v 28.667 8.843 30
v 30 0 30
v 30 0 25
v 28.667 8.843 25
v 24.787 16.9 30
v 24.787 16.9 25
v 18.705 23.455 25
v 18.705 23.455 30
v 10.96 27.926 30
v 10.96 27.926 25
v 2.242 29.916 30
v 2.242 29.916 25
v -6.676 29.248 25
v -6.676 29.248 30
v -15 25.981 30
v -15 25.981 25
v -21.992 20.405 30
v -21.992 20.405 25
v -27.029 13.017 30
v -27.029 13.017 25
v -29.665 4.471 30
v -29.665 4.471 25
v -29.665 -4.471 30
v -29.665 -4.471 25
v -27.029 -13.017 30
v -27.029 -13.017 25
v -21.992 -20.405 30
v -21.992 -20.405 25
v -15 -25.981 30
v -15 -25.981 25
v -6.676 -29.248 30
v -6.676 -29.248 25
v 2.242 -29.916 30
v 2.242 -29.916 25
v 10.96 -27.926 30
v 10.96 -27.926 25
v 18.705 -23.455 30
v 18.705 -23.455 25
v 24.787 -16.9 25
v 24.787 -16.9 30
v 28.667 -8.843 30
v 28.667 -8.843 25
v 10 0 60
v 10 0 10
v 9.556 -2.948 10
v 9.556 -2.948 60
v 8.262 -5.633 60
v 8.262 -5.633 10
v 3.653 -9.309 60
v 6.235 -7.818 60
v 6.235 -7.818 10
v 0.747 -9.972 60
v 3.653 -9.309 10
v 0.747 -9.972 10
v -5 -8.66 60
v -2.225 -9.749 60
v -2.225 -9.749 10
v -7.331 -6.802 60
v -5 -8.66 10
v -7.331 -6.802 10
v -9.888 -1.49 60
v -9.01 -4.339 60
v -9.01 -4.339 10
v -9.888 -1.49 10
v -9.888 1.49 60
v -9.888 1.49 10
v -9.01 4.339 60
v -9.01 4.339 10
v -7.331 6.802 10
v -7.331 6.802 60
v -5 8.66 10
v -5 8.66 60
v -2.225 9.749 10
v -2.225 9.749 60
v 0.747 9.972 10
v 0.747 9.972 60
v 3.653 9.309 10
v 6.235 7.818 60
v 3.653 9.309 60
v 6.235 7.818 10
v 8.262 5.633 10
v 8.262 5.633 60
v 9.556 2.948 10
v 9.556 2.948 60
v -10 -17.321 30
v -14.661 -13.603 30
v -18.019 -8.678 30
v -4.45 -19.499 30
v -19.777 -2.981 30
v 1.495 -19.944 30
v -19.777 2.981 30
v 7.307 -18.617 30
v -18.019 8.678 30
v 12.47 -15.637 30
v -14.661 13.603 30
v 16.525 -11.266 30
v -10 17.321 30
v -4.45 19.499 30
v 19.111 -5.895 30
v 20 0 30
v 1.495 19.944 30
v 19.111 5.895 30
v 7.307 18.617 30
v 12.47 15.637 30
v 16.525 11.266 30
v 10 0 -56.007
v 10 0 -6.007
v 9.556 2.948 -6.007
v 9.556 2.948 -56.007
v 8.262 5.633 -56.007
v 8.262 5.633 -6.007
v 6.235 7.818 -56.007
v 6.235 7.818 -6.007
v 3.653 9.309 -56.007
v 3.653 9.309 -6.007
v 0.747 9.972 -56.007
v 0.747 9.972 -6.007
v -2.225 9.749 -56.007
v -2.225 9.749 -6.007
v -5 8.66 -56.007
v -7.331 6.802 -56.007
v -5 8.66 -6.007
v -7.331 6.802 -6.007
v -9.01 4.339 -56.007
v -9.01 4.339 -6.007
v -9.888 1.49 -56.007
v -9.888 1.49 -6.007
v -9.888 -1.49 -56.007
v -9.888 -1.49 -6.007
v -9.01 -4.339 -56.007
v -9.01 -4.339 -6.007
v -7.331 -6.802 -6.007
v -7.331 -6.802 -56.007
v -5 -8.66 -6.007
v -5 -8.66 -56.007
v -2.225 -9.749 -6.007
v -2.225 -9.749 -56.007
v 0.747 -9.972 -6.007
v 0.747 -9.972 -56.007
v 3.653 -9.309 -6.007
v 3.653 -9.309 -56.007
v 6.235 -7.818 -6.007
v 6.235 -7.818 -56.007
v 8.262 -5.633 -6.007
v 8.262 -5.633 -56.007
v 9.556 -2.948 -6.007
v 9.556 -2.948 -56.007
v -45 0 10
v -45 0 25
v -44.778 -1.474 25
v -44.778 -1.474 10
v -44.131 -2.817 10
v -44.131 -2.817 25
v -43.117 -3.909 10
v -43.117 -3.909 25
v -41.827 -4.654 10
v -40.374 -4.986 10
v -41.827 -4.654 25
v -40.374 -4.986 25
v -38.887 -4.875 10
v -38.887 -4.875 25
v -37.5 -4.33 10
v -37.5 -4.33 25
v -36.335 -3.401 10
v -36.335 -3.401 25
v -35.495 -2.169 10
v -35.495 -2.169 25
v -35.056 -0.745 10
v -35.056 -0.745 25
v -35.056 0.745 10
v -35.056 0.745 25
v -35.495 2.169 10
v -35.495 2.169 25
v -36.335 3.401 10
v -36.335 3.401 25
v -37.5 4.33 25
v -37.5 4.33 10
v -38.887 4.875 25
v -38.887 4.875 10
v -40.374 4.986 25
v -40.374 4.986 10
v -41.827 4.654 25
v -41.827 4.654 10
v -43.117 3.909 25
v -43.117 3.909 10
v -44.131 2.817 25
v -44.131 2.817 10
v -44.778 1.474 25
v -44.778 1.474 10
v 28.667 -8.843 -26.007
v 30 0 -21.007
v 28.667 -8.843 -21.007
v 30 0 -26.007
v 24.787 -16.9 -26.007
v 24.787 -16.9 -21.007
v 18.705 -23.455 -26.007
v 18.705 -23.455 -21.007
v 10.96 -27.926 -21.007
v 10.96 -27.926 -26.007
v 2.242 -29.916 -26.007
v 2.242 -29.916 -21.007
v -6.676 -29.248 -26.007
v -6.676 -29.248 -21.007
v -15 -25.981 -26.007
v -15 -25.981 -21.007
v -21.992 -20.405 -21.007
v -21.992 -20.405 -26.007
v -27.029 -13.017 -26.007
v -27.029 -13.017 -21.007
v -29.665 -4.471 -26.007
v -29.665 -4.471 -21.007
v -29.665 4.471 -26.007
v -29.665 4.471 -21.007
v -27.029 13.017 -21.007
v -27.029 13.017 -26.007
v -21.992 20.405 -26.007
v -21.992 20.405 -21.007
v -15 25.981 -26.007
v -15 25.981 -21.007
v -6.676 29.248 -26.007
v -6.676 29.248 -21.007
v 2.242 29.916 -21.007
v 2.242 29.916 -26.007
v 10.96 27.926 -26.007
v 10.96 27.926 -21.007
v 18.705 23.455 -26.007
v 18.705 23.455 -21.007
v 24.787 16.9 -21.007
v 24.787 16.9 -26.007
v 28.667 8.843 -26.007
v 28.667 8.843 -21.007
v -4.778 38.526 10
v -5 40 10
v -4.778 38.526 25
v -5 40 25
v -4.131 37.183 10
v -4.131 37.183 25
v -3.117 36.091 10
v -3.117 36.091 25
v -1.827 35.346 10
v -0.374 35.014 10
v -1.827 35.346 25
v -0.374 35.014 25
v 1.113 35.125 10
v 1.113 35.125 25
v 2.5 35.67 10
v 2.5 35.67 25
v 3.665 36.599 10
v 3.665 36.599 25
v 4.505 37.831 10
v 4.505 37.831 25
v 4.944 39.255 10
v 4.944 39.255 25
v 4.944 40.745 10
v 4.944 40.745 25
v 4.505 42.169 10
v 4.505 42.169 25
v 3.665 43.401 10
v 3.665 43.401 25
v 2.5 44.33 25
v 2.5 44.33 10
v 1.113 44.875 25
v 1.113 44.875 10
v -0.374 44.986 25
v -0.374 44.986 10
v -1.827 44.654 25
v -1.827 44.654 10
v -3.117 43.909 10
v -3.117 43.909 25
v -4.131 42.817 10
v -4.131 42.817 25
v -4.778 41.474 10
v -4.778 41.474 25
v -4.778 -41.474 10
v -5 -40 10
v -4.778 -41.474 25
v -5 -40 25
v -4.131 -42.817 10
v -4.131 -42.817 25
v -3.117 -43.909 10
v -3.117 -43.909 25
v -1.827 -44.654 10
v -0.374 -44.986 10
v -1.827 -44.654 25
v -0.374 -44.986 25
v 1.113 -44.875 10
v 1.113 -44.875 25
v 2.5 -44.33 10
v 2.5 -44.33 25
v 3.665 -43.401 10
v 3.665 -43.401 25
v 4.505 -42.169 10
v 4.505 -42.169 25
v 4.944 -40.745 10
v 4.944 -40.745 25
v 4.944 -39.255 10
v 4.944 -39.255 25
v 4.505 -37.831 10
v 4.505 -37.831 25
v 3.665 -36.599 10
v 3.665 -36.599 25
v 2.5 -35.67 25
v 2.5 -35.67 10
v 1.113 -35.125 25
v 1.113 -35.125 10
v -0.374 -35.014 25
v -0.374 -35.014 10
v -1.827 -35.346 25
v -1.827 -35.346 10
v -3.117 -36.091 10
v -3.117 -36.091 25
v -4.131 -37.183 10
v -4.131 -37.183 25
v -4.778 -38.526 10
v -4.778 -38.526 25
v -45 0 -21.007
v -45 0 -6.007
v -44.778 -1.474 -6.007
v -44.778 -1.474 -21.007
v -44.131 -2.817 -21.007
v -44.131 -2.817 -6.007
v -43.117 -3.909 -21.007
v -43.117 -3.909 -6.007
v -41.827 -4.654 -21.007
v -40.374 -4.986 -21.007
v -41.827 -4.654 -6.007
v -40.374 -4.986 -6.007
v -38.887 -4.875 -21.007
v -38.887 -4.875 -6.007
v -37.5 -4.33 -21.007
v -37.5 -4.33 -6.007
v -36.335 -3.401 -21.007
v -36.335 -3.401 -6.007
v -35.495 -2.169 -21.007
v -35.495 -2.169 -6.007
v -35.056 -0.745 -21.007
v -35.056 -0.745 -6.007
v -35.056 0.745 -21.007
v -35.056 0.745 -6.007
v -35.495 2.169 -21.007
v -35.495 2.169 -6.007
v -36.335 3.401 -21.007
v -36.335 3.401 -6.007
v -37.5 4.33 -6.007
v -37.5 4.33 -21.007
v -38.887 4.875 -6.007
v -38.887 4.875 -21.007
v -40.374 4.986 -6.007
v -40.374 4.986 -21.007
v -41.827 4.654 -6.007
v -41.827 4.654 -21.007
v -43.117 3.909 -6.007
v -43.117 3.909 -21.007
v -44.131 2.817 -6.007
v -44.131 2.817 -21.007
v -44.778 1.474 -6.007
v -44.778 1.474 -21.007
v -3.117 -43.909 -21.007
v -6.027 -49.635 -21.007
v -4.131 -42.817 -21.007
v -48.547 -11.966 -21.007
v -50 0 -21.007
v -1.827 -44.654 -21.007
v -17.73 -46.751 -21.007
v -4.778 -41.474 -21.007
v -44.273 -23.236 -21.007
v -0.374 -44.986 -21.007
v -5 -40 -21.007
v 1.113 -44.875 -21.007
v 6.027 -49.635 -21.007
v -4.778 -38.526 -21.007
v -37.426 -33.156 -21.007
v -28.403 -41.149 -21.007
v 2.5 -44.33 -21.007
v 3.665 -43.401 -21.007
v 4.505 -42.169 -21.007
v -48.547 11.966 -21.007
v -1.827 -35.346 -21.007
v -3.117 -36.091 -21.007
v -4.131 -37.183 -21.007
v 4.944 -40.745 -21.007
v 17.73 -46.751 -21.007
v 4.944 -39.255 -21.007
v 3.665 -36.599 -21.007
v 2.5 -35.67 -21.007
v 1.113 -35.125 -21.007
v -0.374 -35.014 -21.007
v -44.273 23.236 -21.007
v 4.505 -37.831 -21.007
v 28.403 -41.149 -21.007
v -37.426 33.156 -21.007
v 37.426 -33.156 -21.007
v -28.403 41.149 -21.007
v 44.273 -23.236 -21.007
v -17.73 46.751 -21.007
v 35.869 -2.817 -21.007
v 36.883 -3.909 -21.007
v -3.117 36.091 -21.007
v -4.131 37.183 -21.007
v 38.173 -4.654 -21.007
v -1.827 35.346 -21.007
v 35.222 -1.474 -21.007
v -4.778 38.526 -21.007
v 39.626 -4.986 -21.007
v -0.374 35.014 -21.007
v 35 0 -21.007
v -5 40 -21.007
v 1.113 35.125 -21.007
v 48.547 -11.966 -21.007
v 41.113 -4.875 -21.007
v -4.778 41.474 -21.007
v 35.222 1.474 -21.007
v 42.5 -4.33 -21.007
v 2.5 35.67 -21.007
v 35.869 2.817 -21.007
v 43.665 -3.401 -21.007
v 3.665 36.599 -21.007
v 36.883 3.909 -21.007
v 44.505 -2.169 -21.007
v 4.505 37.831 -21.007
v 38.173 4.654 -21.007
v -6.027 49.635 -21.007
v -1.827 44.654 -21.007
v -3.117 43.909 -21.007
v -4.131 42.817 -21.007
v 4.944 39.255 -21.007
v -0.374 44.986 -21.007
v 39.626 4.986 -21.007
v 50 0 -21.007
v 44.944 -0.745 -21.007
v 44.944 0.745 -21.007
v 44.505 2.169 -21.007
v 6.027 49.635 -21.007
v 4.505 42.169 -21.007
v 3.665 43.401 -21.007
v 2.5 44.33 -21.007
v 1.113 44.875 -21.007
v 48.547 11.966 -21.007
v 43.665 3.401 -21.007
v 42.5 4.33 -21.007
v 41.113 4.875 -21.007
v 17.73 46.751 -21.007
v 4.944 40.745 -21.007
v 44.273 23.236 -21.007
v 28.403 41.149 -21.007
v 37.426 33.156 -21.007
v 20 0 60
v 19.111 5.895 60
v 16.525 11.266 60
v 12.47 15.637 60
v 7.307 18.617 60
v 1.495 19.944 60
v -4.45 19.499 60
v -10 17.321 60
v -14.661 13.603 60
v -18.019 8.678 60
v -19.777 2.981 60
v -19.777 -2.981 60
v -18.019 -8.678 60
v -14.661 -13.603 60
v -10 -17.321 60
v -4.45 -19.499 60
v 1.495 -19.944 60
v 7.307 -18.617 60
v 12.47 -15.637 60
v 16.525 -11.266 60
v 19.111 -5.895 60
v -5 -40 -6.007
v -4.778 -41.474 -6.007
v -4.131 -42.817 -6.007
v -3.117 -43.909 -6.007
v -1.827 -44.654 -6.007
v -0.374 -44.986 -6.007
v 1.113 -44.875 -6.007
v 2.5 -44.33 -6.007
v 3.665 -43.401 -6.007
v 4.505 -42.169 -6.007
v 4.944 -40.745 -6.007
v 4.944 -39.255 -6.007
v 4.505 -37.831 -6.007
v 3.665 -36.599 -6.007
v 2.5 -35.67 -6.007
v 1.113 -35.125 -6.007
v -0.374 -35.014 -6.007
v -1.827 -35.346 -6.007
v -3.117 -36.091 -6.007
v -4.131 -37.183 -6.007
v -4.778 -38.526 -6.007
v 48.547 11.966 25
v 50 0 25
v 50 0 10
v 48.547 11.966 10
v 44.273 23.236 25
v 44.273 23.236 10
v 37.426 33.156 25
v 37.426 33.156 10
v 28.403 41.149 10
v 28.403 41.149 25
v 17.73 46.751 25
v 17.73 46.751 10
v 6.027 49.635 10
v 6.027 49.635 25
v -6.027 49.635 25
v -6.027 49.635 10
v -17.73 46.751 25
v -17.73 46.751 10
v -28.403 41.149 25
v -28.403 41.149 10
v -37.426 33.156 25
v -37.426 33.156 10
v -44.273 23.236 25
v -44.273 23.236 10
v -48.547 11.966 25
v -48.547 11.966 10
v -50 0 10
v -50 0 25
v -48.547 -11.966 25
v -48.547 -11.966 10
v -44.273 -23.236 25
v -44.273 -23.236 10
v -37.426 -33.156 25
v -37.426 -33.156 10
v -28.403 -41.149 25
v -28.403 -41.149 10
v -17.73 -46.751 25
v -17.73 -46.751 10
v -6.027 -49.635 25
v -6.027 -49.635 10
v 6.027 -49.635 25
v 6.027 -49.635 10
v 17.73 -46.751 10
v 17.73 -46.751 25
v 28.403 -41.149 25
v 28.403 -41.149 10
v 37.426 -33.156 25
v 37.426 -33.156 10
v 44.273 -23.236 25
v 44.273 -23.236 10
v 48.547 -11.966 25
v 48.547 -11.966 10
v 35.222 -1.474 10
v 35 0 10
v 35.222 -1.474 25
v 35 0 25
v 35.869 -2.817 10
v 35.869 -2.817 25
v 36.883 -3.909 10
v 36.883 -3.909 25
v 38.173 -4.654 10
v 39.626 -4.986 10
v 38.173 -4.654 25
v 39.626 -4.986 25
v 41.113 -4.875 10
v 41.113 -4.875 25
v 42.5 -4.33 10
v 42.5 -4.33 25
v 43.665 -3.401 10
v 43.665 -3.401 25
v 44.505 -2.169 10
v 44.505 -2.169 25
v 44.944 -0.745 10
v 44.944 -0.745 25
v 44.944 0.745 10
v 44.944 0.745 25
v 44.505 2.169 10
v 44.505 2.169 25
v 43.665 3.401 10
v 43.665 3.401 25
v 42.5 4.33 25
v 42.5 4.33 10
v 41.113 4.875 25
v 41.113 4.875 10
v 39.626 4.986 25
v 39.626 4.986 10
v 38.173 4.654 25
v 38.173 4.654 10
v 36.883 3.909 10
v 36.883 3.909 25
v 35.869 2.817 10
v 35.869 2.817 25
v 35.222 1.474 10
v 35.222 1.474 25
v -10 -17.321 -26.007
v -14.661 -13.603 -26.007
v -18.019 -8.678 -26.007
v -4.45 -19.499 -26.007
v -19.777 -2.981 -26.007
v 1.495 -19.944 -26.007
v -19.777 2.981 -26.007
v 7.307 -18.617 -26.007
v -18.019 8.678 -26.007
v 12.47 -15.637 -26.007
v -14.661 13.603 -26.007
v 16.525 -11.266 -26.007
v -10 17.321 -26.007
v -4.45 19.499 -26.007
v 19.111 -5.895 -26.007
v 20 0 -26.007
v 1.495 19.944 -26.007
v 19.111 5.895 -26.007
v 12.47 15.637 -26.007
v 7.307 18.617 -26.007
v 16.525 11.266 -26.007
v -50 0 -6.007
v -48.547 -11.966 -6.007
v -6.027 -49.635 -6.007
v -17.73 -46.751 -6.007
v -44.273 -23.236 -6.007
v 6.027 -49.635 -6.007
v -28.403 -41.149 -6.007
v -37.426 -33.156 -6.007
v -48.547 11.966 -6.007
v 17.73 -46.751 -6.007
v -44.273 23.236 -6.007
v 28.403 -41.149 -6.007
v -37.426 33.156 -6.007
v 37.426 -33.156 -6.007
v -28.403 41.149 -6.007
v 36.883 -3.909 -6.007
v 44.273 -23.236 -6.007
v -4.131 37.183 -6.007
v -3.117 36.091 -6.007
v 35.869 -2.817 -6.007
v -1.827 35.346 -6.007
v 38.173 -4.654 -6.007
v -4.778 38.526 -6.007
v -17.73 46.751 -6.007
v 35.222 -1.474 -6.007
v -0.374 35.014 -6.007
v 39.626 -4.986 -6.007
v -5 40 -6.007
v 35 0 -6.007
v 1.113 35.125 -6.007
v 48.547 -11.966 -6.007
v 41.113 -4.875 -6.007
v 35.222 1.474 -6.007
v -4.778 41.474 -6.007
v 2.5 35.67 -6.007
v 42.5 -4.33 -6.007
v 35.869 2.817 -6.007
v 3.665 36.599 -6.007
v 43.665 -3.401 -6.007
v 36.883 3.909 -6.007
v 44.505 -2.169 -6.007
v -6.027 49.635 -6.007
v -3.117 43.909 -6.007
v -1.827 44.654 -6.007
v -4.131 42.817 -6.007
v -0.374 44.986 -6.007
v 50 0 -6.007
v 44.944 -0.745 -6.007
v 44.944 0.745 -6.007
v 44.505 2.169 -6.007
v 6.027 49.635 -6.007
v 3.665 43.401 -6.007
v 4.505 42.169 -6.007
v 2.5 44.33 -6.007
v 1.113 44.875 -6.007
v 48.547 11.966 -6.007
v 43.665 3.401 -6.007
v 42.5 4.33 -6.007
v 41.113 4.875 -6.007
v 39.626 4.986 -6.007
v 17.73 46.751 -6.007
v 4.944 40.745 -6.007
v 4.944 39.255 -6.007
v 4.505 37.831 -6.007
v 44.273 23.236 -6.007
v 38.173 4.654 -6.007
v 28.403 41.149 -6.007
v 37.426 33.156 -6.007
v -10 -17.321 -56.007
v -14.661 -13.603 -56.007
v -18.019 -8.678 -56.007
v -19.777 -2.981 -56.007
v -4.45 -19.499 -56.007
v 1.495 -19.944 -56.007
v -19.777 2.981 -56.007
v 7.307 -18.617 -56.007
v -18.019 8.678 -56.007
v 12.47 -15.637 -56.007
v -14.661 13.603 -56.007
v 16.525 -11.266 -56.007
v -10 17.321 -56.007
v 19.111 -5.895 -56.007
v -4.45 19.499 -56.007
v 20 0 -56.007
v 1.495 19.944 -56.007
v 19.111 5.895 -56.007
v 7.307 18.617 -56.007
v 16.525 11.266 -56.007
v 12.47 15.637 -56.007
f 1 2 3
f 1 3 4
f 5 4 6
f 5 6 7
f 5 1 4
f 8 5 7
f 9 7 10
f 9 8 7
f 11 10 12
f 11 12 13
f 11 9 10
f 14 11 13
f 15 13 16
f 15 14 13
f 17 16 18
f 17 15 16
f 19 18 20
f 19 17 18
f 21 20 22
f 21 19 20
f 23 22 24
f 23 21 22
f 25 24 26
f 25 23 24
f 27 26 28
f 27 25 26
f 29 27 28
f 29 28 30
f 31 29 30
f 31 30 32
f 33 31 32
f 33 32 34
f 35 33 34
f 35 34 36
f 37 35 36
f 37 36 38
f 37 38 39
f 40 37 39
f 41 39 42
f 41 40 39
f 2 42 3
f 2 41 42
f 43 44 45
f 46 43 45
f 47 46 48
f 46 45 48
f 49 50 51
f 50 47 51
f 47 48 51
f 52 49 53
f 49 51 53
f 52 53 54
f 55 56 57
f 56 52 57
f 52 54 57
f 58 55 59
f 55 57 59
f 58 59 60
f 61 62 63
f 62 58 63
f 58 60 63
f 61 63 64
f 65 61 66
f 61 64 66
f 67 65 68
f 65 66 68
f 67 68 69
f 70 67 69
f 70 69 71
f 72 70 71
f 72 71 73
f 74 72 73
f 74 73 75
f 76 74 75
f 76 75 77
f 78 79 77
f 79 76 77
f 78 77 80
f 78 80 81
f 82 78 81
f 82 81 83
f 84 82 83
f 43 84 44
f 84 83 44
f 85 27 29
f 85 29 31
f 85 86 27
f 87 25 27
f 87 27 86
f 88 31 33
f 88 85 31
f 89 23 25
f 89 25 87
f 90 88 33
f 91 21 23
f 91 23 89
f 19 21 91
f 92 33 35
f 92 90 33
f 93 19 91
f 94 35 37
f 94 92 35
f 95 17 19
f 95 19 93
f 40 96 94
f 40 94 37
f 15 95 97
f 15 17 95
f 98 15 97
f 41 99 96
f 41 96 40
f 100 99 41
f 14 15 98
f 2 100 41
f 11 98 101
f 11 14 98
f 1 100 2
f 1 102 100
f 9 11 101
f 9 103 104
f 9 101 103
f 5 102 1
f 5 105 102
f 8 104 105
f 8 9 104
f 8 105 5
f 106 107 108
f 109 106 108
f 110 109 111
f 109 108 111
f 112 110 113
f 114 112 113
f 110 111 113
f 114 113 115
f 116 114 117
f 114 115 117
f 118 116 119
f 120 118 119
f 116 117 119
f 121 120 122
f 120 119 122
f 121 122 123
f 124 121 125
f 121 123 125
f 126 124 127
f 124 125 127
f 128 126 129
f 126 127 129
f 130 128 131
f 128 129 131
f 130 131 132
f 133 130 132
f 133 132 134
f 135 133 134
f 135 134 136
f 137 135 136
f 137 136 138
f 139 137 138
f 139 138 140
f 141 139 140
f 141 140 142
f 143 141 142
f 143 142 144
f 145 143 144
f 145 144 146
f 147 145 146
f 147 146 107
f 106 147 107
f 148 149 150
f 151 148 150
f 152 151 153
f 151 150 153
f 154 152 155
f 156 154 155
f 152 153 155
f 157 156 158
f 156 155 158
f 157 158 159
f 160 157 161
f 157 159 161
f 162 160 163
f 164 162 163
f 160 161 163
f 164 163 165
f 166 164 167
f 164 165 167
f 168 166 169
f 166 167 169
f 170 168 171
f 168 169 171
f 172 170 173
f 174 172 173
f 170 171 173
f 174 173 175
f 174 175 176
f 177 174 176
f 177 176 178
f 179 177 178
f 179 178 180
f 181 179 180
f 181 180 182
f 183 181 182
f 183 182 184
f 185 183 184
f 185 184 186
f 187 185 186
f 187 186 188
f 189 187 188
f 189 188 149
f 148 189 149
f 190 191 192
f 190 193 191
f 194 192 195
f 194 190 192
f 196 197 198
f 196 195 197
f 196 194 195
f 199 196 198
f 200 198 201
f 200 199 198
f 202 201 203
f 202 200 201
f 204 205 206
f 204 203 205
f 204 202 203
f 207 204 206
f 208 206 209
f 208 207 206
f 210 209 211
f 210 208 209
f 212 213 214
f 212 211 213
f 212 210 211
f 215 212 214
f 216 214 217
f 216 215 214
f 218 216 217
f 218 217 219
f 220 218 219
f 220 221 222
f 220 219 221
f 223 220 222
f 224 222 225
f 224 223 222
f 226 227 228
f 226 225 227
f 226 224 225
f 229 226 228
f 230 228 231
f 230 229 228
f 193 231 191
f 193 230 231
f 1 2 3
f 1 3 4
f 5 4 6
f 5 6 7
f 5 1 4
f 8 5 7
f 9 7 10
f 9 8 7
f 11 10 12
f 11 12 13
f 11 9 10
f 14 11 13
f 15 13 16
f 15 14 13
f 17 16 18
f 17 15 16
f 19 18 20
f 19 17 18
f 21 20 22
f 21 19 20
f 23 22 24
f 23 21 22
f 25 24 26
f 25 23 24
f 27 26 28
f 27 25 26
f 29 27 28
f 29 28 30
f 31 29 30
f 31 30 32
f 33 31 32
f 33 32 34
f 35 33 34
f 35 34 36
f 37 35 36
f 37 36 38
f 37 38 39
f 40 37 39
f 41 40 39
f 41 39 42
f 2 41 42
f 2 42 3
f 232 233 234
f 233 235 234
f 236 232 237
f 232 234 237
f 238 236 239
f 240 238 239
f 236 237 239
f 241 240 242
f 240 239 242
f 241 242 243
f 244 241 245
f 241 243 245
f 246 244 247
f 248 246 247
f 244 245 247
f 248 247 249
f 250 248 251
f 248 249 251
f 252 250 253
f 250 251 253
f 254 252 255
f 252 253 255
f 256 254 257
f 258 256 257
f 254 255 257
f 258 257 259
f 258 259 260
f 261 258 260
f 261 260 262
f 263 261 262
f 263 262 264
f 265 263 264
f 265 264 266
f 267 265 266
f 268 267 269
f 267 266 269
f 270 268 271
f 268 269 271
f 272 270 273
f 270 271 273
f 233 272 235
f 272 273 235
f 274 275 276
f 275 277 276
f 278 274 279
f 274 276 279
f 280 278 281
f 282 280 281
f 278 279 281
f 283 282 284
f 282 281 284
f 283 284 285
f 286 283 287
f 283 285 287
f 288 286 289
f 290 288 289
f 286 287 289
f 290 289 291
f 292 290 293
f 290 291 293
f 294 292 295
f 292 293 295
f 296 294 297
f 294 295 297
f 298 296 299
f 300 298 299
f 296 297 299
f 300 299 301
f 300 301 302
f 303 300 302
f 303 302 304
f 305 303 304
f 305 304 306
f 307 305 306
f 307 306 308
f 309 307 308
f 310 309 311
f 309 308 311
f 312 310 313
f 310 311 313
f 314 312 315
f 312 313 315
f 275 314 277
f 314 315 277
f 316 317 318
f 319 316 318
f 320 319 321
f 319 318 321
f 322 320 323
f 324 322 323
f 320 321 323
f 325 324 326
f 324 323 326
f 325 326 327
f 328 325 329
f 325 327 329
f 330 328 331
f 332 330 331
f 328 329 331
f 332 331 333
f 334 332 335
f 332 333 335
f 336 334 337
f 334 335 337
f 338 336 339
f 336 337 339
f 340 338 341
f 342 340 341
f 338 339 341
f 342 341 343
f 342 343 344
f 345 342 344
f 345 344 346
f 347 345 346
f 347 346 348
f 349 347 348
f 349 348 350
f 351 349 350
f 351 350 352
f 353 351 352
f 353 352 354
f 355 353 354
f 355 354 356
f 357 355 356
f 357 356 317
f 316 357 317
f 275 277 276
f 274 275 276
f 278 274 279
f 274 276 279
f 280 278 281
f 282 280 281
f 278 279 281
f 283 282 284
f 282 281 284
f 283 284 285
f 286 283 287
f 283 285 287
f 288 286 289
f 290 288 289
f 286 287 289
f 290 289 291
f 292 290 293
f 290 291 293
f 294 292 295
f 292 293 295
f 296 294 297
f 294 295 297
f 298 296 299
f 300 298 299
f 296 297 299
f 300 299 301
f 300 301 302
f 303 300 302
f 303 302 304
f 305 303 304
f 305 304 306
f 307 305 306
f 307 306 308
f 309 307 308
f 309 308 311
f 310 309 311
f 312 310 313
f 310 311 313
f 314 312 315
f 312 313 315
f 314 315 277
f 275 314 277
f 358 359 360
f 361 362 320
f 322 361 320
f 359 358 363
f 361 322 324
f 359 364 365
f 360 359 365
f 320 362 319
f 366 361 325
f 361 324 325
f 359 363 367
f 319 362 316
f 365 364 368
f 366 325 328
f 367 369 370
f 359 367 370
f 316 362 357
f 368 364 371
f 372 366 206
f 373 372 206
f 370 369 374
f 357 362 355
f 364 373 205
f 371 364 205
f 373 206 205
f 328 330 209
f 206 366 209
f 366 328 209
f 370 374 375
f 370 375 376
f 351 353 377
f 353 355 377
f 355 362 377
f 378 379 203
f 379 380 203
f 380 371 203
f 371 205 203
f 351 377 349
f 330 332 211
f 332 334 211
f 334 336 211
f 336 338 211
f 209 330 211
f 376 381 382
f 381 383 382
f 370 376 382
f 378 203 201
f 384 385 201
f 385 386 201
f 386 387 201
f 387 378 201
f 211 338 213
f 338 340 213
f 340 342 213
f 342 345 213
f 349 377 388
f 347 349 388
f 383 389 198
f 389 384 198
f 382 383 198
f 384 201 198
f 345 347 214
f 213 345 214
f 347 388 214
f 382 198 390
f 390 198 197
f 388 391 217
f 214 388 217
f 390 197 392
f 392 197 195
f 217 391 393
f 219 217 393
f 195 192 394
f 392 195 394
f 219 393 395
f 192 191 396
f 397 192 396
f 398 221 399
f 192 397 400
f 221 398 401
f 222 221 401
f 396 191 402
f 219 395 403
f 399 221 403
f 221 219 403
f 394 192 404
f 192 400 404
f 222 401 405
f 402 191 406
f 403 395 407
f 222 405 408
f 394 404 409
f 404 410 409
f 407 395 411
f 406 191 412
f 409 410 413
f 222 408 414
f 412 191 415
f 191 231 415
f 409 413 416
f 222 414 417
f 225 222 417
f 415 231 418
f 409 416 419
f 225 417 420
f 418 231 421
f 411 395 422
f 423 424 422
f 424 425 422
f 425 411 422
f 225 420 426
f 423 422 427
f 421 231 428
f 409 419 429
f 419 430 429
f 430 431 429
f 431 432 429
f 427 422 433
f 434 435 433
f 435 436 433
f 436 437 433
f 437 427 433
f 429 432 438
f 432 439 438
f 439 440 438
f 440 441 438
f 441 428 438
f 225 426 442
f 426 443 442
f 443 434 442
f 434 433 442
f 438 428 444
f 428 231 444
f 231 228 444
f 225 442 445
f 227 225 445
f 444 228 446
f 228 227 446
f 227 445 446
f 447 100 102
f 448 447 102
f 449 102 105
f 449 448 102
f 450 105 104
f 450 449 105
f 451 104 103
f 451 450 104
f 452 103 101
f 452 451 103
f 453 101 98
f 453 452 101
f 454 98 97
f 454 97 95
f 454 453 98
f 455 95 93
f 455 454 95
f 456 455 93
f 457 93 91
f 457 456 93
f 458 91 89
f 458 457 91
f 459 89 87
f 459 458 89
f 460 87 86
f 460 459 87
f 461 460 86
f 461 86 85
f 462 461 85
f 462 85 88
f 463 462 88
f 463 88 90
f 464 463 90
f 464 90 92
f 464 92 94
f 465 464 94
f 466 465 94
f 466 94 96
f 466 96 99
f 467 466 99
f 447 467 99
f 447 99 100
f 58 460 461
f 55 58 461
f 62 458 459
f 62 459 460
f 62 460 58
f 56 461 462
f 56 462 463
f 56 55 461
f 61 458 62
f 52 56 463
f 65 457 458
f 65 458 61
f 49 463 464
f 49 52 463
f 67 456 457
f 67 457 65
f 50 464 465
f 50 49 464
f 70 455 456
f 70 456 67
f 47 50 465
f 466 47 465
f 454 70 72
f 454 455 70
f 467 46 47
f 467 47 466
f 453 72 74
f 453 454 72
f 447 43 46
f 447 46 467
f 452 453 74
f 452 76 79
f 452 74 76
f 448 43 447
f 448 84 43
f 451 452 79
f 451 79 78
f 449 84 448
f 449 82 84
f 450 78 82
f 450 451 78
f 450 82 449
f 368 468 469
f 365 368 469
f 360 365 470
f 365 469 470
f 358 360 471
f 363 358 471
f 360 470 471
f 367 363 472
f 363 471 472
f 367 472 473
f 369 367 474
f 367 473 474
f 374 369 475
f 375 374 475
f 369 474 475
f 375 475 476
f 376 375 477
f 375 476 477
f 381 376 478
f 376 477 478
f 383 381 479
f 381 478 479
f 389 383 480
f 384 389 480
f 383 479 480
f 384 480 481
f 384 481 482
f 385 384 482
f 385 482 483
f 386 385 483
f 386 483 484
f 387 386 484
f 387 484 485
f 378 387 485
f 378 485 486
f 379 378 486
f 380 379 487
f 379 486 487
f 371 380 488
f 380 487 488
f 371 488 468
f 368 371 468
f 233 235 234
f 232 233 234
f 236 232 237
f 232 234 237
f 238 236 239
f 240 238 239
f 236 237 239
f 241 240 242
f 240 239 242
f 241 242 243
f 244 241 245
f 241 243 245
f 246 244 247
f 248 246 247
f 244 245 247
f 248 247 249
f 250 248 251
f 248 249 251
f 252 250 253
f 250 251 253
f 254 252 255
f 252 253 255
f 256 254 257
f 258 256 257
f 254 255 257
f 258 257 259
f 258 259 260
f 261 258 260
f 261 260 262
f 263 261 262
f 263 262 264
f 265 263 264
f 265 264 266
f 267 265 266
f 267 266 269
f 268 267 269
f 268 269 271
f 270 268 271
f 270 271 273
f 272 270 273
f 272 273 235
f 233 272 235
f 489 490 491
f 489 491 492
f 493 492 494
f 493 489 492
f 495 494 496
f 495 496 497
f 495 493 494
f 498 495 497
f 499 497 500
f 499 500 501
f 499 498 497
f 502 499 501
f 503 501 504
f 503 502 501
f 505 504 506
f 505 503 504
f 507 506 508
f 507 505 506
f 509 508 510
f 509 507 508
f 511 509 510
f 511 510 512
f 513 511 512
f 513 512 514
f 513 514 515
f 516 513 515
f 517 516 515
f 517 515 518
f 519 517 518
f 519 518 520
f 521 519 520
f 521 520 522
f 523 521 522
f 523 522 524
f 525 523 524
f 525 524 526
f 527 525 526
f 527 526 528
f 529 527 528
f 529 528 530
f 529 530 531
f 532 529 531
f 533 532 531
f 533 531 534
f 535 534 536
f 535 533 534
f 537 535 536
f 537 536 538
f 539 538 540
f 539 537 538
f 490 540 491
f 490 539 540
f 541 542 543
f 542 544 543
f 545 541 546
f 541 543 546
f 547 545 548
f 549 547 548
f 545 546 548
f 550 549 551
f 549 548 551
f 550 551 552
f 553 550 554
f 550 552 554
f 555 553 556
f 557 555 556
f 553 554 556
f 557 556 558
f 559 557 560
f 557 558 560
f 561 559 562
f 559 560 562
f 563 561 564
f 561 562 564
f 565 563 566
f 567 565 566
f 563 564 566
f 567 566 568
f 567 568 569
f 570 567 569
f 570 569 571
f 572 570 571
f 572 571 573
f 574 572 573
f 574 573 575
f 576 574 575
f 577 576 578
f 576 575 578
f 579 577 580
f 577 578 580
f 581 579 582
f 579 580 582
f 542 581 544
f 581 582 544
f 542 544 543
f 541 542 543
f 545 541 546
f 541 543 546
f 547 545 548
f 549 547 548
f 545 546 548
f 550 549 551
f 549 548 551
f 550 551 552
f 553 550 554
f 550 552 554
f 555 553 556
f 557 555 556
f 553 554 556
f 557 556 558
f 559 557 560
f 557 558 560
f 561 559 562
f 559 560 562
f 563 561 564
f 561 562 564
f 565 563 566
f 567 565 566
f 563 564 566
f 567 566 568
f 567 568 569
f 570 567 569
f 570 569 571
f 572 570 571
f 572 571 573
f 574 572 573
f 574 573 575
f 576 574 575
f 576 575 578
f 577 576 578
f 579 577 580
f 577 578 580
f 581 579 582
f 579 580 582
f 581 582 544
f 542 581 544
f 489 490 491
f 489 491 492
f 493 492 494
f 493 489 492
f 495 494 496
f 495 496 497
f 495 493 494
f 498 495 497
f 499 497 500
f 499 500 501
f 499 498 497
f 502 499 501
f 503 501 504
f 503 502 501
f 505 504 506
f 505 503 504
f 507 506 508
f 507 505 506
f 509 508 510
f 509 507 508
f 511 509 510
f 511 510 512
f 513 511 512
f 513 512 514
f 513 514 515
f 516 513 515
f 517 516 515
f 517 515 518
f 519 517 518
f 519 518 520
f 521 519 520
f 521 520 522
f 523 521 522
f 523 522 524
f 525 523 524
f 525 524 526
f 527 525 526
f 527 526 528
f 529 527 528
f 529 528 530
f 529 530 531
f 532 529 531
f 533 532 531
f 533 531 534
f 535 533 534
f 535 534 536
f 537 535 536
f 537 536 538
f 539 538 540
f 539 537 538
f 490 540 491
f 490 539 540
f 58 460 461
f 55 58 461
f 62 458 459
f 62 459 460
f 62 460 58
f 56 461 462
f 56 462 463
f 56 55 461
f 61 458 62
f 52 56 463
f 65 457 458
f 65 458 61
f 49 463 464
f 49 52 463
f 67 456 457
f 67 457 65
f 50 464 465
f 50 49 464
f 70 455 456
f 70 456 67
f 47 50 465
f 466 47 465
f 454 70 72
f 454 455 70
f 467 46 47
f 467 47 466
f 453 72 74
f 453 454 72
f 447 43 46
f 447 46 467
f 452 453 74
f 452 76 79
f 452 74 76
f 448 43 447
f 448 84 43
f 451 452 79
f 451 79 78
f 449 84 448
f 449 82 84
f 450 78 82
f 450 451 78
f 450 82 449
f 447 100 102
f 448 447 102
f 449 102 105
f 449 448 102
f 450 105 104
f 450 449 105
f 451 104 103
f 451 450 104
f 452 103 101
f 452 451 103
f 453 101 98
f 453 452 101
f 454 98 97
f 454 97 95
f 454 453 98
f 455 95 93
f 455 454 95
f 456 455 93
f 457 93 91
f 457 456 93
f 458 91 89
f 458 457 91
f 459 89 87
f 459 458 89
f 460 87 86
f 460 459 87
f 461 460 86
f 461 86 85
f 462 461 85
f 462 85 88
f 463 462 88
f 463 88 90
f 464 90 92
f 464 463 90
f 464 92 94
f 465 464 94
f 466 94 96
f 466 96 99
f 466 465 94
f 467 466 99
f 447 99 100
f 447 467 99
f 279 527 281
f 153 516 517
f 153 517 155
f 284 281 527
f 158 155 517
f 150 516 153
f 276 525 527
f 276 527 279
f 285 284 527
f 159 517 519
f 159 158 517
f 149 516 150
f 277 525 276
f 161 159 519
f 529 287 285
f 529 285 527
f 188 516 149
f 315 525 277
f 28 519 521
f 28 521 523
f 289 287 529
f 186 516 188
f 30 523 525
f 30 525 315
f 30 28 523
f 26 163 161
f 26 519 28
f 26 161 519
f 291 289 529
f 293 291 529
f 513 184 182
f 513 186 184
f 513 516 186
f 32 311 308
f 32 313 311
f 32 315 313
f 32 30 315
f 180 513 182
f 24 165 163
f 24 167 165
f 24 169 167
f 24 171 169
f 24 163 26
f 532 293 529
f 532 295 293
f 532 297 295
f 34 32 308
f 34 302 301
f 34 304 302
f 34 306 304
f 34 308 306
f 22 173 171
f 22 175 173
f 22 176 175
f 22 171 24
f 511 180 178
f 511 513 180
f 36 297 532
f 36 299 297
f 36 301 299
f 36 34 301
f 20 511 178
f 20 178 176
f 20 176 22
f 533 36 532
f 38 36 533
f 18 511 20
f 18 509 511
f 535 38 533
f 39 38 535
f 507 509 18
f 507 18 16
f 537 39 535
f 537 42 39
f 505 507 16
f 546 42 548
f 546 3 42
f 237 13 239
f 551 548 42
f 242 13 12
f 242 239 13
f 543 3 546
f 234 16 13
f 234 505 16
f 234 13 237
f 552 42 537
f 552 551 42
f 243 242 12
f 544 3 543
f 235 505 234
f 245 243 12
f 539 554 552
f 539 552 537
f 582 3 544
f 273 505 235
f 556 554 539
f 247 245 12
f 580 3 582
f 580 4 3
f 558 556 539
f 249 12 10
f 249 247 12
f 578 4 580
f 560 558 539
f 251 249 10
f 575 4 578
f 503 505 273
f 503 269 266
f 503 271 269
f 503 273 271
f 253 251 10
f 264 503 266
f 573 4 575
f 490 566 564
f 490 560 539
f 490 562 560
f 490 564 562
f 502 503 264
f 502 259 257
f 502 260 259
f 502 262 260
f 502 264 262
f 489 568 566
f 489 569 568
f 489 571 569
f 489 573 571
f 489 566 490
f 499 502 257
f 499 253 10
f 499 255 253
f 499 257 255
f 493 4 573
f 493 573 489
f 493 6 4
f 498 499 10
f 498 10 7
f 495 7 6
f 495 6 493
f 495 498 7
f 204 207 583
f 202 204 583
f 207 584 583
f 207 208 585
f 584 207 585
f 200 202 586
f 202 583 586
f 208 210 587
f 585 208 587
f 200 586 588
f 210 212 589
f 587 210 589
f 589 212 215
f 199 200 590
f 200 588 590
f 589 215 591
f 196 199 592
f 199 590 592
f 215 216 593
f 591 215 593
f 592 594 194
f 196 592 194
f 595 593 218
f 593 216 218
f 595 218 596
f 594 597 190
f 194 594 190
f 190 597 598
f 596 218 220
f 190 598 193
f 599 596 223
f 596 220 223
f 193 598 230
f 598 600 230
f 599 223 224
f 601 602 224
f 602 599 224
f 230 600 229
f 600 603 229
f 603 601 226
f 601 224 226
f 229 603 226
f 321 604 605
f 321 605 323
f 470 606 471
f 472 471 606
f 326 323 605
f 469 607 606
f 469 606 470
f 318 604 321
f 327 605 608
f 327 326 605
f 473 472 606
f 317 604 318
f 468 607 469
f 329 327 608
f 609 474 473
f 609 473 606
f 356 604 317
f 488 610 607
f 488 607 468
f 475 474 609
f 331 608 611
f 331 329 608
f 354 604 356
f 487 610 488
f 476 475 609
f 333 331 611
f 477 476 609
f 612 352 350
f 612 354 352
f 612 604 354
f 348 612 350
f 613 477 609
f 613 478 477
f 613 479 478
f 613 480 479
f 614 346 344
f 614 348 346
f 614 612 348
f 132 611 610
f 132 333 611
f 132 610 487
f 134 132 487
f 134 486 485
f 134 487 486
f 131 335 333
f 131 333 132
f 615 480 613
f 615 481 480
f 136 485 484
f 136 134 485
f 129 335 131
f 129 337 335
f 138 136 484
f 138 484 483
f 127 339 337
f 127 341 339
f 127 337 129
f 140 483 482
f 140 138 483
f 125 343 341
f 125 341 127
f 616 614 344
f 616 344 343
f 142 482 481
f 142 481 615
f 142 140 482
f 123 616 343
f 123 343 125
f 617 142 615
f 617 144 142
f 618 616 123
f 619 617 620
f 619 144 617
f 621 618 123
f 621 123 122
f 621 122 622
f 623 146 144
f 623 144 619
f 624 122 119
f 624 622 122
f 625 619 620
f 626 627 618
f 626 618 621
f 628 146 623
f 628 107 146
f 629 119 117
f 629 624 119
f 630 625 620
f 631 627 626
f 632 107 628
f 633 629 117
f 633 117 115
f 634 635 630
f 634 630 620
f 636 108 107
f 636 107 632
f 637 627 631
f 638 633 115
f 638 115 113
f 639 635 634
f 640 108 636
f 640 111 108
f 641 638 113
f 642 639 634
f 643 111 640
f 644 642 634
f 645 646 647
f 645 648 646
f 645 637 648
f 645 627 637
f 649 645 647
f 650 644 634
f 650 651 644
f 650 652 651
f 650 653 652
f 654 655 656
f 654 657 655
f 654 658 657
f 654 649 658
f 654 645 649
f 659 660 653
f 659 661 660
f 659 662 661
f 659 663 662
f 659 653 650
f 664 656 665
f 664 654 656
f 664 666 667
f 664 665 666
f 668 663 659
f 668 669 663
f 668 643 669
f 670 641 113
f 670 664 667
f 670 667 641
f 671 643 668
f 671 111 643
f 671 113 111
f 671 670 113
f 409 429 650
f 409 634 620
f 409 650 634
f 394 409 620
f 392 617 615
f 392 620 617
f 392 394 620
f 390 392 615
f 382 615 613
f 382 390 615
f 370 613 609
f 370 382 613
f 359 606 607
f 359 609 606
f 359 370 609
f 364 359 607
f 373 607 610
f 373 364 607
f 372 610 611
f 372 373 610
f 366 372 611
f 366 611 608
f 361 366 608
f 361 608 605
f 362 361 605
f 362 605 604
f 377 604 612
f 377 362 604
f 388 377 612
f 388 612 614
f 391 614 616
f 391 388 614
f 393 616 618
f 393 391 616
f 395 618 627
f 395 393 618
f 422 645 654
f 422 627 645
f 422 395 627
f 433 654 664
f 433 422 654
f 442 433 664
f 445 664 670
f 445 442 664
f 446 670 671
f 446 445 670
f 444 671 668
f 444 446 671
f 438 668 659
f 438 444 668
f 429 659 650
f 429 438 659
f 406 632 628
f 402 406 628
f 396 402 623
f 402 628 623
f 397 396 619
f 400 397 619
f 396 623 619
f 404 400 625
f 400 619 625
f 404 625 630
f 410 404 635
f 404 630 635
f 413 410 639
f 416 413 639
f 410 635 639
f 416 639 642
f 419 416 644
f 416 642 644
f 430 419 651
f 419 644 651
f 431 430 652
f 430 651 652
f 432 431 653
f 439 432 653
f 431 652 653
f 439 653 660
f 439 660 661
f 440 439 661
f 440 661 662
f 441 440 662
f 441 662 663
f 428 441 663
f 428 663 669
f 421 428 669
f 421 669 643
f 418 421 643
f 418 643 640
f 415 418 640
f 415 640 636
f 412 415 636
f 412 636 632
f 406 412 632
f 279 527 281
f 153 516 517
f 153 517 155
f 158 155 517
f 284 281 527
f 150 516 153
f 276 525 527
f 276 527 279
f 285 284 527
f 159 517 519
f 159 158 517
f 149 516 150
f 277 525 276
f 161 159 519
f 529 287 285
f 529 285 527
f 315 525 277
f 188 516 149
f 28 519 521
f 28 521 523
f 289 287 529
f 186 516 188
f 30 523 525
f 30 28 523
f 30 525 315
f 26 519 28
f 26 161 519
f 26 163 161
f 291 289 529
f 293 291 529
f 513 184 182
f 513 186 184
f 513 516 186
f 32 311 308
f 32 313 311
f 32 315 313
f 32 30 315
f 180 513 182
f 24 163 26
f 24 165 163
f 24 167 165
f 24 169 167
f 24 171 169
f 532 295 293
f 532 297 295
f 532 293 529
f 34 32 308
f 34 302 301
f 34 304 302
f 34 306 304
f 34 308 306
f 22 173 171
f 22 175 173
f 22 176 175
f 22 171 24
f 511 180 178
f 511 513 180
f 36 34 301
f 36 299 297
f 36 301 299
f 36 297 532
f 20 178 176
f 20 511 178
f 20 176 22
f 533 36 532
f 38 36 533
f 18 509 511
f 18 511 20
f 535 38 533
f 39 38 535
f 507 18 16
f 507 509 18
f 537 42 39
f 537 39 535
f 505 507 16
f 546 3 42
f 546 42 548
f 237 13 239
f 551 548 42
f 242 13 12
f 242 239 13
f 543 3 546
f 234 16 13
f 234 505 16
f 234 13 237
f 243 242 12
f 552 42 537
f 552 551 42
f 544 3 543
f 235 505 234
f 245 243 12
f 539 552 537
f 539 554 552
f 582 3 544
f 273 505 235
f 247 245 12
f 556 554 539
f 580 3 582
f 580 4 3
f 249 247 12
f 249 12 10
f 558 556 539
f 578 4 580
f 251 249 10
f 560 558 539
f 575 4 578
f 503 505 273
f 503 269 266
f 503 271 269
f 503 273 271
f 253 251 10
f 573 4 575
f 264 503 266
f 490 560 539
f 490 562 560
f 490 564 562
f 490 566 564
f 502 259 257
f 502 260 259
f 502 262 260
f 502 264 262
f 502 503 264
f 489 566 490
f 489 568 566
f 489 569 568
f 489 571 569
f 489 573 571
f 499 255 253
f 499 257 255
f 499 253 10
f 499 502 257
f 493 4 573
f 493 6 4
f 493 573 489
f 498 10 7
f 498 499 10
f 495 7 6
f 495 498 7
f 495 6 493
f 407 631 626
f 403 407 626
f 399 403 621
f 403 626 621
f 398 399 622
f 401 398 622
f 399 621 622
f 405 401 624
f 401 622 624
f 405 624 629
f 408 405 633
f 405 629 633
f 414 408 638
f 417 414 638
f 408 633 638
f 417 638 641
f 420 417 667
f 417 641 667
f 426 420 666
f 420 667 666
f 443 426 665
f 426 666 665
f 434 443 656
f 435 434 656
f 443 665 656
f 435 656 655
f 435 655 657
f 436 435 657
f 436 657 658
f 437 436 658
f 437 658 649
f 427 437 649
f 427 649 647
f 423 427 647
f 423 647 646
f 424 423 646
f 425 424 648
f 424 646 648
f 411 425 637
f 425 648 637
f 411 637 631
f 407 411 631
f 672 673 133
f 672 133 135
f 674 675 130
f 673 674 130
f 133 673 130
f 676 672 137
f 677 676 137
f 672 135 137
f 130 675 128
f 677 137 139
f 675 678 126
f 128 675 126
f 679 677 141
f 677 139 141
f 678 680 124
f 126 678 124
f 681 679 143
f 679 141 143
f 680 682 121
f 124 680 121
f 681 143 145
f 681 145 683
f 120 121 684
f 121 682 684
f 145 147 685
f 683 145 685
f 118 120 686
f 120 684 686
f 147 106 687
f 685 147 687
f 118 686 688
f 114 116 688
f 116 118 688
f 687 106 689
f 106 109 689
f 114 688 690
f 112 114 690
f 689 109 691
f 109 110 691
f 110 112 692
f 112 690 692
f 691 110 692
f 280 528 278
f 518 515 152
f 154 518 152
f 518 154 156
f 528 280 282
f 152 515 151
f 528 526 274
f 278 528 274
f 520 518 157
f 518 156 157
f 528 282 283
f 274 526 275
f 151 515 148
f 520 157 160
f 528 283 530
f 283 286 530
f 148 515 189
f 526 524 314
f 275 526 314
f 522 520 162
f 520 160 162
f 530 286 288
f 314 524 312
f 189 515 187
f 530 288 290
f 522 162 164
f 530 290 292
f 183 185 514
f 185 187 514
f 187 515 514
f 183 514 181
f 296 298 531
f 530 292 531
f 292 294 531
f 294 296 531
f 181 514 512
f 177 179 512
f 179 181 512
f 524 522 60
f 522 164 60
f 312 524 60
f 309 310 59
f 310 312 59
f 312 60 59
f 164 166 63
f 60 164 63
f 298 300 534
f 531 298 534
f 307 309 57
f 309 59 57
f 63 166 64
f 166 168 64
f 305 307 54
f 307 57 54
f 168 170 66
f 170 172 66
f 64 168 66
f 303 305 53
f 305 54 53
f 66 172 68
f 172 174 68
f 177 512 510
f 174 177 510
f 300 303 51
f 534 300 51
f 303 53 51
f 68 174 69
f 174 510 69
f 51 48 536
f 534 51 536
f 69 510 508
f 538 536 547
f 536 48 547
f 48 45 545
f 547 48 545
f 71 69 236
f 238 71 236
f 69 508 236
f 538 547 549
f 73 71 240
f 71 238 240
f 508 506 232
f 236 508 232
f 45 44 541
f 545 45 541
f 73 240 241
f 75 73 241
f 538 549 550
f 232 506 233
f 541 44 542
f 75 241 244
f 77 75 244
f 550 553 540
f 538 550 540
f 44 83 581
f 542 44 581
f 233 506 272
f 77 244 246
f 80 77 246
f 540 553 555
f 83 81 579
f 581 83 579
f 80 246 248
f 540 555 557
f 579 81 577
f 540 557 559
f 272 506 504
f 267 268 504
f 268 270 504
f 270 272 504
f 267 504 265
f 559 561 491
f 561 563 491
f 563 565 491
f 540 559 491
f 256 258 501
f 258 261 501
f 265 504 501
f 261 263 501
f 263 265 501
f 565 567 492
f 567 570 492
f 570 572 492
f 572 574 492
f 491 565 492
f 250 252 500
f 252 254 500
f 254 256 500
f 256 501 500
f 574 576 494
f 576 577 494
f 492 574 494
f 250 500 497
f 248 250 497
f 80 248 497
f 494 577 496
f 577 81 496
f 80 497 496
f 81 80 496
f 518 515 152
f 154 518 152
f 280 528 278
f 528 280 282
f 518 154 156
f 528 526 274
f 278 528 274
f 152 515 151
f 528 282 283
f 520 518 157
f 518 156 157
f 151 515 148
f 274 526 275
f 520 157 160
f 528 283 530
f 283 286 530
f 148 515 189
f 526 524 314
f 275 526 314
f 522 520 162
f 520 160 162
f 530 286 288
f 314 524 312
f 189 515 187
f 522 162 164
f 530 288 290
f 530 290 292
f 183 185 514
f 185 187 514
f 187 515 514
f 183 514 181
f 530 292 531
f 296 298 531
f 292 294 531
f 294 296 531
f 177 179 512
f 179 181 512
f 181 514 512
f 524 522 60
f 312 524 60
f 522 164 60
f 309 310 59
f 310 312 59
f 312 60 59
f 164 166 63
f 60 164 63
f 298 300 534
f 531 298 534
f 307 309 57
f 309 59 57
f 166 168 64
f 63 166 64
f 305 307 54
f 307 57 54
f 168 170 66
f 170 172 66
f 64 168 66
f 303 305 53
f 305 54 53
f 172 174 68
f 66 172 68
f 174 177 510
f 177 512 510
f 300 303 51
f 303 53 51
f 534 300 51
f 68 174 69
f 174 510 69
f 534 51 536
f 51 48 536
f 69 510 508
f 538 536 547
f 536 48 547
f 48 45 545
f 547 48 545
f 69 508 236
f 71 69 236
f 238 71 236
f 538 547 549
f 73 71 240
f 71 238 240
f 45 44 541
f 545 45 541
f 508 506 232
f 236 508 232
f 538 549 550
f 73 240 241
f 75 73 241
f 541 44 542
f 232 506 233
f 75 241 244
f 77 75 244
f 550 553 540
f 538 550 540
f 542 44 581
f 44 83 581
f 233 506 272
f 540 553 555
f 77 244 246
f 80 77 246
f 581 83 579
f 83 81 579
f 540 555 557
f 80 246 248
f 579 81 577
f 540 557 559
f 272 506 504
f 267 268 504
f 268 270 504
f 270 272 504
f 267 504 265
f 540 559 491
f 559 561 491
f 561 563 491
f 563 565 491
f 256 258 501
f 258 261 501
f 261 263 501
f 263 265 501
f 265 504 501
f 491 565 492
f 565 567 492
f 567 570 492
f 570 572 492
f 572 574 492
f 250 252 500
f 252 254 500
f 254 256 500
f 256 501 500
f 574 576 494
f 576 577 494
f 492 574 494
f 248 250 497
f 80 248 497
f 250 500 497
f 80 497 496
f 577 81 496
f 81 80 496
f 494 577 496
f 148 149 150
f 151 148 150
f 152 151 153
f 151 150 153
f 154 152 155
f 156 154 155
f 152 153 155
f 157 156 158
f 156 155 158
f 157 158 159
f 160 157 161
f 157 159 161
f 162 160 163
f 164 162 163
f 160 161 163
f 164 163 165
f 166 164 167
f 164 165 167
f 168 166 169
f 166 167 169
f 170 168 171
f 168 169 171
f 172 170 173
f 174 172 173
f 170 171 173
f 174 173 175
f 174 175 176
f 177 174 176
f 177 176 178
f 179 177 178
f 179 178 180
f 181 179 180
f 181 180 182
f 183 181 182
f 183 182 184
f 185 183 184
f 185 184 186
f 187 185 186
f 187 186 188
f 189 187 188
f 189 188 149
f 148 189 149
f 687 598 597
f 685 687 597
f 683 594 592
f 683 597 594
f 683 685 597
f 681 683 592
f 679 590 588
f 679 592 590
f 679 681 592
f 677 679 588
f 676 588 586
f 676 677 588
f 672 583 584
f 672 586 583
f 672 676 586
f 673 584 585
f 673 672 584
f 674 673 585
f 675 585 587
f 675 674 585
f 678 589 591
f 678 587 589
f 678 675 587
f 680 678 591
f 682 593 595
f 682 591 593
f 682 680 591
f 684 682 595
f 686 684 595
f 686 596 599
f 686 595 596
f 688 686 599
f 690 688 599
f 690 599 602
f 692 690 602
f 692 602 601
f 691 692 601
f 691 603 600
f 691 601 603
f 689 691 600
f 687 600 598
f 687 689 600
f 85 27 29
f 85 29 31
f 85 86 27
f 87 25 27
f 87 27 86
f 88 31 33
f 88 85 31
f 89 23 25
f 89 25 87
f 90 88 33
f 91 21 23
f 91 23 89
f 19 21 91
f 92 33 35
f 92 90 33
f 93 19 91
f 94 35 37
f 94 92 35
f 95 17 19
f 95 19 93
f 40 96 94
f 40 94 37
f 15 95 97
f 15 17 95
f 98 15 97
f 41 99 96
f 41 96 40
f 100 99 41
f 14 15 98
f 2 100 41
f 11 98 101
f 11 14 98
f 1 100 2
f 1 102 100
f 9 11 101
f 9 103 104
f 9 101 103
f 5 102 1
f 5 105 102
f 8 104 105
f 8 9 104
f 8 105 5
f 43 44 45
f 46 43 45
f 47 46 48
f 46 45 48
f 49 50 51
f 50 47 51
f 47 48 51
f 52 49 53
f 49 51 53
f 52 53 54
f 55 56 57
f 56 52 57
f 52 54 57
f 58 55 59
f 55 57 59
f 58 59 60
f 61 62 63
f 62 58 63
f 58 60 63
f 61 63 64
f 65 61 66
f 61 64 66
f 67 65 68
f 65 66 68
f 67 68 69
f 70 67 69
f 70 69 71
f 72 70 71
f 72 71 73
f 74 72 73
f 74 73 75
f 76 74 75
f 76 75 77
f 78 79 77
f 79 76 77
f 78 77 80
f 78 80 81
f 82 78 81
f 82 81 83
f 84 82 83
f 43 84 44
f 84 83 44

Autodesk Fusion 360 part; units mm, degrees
sketch "Sketch1" plane through (0, 0, 0) normal (0, 1, 0) x (1, 0, 0)
  line L0 (10, -60) -> (10, -10)
  line L1 (10, -10) -> (50, -10)
  line L2 (50, -10) -> (50, -25)
  line L3 (50, -25) -> (30, -25)
  line L4 (30, -25) -> (30, -30)
  line L5 (30, -30) -> (20, -30)
  line L6 (20, -30) -> (20, -60)
  line L7 (10, -60) -> (20, -60)
  line L8 (59.5256, -1.9963) -> (0, -1.9963)
  line L9 (10, 56.0073) -> (20, 56.0073)
  line L10 (20, 26.0073) -> (20, 56.0073)
  line L11 (10, 56.0073) -> (10, 6.0073)
  line L12 (10, 6.0073) -> (50, 6.0073)
  line L13 (50, 6.0073) -> (50, 21.0073)
  line L14 (50, 21.0073) -> (30, 21.0073)
  line L15 (30, 21.0073) -> (30, 26.0073)
  line L16 (30, 26.0073) -> (20, 26.0073)
revolve "Revolve2" add sketch "Sketch1" angle 360 about axis through (0, 0, 1.75) along (0, 0, 1) makes body 1 at (36.4433, -2.9808, 10) makes body 2 at (36.4433, -2.9808, -6.0073)
revolve "Revolve1" add sketch "Sketch1" angle 360 about axis through (0, 0, 1.75) along (0, 0, 1) separate body contours L0 L1 L2 L3 L4 L5 L6 L7 makes body 3
sketch "Sketch2" plane through (0, 0, 25) normal (0, 0, 1) x (-1, 0, 0)
  circle A0 centre (0, 0) radius 50
  circle A1 centre (0, 0) radius 30
  circle A2 centre (0, -40) radius 5
  circle A3 centre (-40, 0) radius 5
  circle A4 centre (0, 40) radius 5
  circle A5 centre (40, 0) radius 5
extrude "Extrude1" cut sketch "Sketch2" against normal blind 50 contours A2 | A3 | A4 | A5 bodies 1 2 3
